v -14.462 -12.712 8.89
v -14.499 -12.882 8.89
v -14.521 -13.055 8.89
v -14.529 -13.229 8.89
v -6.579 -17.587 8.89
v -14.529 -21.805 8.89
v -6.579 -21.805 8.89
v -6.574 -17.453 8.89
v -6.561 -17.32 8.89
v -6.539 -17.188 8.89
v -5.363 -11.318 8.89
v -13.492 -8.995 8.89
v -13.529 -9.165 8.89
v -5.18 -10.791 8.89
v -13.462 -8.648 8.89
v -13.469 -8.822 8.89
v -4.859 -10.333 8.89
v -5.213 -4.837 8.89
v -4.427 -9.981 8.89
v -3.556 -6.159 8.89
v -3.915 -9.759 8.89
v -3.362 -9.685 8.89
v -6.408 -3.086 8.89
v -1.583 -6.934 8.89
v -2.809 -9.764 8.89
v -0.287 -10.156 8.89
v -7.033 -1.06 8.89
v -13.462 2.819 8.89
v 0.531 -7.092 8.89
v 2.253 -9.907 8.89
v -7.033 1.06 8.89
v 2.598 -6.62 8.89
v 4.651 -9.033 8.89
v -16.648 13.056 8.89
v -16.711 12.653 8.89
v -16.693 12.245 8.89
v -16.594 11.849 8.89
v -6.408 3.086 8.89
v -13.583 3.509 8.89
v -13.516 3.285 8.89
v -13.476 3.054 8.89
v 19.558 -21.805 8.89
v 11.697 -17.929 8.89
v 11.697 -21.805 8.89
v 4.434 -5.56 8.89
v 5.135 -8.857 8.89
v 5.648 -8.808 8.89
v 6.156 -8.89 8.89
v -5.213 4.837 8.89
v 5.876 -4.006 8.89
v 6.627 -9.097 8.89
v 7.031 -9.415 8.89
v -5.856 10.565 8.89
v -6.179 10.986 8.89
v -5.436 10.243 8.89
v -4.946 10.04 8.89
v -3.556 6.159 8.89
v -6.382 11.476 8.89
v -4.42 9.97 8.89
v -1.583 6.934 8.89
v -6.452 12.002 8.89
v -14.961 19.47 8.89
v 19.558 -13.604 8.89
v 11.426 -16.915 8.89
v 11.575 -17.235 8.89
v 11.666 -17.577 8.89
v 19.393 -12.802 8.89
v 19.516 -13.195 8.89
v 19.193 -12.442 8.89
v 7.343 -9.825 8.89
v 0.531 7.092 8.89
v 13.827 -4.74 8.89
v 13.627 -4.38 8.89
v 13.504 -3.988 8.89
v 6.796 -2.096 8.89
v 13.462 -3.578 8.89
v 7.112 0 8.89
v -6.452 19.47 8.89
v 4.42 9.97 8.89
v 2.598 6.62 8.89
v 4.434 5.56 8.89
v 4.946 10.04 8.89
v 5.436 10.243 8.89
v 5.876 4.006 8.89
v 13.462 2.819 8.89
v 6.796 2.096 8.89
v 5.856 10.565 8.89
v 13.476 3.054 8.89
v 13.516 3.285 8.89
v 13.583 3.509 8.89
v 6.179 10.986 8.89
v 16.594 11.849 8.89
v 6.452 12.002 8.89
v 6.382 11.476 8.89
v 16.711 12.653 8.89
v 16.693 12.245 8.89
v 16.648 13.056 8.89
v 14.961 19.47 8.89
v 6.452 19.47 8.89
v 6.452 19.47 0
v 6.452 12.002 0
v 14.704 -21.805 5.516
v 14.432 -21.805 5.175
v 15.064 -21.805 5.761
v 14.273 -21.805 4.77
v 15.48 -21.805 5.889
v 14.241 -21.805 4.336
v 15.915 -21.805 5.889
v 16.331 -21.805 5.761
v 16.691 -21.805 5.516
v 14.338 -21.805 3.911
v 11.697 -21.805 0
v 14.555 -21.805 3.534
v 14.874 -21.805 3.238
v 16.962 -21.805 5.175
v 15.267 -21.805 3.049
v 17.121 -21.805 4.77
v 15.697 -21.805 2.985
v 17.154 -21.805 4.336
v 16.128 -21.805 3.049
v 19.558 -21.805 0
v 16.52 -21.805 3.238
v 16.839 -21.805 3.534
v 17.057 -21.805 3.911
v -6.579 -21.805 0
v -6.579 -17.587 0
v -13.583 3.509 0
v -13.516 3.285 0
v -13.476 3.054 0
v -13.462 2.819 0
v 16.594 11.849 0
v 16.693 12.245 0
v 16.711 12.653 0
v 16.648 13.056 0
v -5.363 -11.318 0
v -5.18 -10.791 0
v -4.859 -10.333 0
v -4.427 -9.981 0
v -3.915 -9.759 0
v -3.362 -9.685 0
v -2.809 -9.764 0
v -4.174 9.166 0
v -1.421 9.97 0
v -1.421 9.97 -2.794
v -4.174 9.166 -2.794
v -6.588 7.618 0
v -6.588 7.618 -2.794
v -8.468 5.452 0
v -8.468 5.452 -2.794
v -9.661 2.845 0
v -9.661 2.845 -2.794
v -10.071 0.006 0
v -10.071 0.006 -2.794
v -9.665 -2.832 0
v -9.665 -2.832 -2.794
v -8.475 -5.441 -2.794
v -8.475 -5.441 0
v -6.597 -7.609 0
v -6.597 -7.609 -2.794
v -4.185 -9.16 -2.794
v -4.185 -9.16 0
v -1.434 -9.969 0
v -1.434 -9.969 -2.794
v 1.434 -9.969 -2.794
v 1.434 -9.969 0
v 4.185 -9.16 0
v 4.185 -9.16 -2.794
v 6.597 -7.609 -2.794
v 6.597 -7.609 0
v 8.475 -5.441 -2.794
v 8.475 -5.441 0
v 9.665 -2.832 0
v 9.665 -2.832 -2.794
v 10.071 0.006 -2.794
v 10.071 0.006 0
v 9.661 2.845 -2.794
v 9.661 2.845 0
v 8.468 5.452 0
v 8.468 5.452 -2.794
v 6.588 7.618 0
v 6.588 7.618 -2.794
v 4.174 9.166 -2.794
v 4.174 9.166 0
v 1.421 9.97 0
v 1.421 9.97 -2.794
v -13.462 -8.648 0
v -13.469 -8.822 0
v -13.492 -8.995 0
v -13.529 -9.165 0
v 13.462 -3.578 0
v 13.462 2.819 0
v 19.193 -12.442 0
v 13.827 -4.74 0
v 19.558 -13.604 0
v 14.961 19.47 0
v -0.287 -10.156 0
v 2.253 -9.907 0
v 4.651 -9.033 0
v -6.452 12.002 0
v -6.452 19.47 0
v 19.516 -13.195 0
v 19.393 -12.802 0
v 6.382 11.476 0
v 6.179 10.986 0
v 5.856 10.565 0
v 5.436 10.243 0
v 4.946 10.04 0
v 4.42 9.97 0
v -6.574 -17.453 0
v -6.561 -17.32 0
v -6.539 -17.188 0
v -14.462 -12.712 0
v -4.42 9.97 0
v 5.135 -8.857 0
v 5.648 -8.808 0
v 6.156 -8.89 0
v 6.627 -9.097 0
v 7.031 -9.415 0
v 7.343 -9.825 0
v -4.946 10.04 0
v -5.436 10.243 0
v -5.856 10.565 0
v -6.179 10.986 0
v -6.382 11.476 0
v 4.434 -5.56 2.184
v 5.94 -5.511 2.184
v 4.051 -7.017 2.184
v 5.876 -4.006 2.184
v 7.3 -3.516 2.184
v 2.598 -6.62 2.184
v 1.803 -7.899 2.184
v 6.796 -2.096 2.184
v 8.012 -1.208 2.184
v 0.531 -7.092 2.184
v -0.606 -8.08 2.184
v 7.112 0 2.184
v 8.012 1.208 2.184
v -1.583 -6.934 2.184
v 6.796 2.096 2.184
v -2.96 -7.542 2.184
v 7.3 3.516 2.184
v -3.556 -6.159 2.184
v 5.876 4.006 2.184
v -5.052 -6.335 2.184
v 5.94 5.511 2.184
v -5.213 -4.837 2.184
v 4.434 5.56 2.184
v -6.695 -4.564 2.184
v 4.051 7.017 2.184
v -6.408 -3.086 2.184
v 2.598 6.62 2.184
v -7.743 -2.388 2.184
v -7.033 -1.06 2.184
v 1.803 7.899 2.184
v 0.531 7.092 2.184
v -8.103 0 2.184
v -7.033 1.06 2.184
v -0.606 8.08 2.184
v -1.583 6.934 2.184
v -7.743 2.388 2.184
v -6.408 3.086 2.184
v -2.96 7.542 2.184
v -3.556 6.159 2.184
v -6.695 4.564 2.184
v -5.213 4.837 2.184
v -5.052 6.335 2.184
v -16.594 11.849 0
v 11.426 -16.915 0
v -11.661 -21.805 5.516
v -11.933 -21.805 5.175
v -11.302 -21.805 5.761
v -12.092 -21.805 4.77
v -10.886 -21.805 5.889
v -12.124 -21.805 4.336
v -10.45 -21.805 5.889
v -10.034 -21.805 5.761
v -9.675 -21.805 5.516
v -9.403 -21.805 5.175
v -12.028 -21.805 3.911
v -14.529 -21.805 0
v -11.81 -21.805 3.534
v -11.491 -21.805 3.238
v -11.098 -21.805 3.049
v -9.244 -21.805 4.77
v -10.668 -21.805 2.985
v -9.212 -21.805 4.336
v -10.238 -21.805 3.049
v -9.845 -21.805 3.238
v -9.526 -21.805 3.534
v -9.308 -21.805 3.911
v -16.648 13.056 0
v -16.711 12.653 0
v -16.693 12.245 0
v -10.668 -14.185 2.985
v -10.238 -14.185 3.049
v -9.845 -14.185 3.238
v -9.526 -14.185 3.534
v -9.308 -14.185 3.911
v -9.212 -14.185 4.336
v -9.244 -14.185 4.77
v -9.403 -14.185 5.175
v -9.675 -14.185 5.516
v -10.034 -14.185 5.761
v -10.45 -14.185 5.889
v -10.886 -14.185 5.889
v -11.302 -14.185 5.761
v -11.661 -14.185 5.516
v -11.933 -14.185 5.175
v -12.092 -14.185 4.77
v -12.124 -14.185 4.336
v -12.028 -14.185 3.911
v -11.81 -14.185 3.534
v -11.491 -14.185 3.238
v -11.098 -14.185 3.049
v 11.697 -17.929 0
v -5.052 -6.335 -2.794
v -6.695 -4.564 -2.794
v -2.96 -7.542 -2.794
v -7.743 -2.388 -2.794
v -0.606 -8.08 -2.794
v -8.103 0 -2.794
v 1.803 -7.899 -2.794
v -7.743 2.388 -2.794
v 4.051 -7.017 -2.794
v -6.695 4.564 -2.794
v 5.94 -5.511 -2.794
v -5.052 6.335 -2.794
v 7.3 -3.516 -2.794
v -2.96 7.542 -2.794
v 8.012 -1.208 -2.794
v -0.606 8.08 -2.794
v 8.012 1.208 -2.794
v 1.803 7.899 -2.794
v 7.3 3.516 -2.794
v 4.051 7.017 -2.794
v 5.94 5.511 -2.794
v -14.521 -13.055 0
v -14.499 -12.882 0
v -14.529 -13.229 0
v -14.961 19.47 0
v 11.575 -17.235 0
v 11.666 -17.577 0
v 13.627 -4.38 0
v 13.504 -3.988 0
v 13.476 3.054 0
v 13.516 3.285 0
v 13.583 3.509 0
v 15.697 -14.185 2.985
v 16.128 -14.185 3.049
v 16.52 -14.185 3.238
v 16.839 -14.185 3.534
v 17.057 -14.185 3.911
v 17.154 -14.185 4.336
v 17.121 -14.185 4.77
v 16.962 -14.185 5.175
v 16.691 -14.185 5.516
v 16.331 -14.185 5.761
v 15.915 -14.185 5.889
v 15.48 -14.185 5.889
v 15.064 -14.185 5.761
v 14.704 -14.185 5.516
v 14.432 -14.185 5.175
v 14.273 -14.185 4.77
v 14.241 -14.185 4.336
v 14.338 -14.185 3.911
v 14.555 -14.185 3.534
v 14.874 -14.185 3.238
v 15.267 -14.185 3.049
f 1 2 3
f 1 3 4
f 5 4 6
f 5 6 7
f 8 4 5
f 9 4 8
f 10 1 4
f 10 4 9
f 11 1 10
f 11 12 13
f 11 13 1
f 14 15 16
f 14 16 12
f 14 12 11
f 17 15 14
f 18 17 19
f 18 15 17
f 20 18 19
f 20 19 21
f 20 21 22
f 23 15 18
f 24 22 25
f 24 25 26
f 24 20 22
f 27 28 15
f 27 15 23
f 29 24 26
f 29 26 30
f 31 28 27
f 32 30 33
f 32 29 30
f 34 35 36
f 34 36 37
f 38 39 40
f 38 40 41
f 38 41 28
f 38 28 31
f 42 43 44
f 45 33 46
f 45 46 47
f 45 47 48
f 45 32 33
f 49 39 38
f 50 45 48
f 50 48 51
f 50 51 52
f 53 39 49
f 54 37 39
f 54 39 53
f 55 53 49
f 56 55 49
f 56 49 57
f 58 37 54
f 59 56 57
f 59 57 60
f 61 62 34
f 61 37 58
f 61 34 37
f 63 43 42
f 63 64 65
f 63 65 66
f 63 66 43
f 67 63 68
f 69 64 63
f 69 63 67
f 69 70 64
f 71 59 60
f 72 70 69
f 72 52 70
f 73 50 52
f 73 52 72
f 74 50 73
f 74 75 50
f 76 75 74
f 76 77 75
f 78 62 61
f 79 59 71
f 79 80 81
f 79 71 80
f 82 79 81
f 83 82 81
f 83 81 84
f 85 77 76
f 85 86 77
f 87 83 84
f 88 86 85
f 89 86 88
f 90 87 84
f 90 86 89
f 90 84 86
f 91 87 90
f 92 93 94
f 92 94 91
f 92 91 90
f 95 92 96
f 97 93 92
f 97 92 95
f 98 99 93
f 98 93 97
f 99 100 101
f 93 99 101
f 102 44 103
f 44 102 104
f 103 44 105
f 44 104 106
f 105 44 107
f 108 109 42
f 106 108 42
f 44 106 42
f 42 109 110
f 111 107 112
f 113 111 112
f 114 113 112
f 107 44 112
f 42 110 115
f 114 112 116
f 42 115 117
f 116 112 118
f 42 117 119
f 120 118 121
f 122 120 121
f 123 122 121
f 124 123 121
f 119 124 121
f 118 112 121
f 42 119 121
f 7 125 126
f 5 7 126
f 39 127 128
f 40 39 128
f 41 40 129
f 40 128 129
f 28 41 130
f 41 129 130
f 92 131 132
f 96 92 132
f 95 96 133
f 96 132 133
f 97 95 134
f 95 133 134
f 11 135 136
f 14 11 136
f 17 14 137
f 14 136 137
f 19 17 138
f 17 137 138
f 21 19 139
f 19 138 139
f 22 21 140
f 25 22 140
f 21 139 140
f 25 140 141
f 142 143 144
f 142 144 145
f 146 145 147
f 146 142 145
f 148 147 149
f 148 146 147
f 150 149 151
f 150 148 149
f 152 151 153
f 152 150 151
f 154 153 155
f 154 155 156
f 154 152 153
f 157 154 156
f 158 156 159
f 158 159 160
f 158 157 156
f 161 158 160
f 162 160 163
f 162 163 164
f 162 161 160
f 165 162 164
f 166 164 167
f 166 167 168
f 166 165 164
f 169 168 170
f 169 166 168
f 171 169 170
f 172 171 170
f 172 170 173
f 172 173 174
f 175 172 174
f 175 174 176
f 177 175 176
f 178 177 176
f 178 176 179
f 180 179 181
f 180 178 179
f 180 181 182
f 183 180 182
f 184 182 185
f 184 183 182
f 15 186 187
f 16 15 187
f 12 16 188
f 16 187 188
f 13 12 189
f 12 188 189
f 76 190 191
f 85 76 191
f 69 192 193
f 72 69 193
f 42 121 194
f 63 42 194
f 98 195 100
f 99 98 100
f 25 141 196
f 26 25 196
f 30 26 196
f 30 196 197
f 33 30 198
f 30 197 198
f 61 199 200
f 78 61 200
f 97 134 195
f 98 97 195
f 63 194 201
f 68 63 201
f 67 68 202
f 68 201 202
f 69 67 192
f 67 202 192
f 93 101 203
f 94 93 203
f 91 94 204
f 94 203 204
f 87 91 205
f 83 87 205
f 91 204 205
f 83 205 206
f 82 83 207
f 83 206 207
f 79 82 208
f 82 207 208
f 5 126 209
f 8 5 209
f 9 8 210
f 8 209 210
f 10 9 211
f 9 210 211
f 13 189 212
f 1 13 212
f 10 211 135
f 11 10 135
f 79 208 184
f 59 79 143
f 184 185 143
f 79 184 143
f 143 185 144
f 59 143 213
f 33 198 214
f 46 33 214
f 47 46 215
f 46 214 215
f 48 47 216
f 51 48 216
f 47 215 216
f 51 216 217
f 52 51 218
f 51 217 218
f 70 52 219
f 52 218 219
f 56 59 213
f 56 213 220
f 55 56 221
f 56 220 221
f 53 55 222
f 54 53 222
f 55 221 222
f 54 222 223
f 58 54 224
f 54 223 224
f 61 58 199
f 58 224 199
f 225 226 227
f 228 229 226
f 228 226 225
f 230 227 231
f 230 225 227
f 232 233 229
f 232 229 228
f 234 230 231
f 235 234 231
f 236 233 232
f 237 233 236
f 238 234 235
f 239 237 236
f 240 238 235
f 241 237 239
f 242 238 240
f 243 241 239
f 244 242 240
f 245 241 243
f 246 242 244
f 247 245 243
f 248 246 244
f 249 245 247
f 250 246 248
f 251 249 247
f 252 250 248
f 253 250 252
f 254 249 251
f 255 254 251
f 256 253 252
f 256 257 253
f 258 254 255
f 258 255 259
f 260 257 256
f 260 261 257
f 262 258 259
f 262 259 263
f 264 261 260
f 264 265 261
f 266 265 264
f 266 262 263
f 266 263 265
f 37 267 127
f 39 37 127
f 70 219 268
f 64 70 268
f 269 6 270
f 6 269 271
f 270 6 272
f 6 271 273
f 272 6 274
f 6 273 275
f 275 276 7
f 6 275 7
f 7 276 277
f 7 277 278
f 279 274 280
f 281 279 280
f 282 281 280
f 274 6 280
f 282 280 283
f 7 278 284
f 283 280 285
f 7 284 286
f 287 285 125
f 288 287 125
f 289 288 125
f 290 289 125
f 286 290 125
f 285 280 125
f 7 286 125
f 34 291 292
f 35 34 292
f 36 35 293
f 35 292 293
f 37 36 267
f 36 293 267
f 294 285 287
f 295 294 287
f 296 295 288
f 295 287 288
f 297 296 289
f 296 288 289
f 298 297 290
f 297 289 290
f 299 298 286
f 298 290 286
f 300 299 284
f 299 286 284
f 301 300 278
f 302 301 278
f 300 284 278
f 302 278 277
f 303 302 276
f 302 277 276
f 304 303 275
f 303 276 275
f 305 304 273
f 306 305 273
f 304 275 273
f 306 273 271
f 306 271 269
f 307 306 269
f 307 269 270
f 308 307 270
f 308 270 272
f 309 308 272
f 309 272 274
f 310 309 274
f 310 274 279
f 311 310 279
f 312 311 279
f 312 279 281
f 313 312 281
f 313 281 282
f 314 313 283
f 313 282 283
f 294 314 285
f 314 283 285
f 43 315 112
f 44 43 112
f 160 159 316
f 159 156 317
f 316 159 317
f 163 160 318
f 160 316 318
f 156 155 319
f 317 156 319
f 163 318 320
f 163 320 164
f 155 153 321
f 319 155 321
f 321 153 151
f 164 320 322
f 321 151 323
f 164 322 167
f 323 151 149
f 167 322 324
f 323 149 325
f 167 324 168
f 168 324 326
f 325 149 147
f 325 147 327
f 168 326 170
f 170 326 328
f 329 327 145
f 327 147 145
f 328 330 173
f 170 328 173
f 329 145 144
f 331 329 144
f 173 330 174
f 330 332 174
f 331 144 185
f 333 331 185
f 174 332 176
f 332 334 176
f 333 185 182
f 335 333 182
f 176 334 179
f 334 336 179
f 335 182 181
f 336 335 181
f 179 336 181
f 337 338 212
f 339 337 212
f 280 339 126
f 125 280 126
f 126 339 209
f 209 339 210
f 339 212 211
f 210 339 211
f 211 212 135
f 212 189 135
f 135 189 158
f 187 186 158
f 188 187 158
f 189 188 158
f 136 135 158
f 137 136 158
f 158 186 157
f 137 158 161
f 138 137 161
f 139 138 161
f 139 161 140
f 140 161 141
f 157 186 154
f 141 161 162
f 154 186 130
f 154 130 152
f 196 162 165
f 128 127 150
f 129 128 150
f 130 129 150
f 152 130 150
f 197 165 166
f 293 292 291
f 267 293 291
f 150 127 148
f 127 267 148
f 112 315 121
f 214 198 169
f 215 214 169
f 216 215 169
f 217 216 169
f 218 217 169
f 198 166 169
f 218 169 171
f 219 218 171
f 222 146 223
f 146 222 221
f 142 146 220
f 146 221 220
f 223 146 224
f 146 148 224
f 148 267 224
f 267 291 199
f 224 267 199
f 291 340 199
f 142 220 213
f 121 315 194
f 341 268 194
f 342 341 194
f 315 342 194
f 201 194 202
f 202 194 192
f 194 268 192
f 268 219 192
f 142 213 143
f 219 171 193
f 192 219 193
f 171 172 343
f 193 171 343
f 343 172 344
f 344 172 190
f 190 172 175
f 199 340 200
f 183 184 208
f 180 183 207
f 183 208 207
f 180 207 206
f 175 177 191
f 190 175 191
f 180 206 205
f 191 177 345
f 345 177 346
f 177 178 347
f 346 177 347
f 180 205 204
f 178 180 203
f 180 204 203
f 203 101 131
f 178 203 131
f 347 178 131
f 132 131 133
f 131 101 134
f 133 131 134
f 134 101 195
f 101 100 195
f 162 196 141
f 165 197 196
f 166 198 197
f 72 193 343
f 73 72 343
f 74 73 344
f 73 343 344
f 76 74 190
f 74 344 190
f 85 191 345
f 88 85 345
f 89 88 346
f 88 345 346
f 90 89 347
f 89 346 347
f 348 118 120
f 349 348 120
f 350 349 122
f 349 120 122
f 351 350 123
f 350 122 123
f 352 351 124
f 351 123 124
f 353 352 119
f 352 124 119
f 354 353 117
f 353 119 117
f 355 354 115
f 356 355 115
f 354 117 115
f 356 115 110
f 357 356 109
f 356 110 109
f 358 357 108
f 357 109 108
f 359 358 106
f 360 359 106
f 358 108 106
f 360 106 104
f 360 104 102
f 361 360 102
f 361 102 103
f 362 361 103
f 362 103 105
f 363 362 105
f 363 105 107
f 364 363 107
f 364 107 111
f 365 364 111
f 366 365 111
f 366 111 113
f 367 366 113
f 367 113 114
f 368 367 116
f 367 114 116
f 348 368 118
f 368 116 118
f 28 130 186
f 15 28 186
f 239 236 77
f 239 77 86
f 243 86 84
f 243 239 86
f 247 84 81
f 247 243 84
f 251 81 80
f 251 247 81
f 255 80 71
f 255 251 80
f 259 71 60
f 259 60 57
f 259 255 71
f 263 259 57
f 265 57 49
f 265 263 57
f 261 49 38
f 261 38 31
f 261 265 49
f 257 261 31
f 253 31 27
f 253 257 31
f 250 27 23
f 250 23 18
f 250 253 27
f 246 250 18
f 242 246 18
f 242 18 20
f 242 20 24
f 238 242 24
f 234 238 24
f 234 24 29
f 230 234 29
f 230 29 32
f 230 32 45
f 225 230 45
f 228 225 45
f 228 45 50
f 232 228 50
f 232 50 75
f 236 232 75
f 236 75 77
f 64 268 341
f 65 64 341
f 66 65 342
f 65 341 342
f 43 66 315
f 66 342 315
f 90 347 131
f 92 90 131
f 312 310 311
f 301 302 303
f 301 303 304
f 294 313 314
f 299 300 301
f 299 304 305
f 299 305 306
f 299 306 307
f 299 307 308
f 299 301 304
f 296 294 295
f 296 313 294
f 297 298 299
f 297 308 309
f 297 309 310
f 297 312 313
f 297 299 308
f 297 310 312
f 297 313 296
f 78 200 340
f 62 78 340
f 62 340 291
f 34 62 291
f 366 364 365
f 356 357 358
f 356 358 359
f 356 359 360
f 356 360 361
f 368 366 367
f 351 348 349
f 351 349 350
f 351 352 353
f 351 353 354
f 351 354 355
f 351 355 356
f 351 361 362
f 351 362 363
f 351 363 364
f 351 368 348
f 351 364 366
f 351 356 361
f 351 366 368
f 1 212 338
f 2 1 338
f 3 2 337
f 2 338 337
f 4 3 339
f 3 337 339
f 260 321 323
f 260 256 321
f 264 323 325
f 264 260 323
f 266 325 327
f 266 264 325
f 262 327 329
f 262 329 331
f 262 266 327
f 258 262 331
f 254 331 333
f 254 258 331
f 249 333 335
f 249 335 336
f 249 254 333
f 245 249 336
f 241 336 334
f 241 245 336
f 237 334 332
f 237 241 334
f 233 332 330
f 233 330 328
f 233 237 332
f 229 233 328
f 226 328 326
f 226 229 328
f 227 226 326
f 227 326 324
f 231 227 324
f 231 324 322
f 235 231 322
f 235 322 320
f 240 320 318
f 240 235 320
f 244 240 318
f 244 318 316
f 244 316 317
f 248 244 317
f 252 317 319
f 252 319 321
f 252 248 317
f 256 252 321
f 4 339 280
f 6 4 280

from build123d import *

# Parameters (mm, degrees)
SKETCH1_R           = 7.112
BOSS_EXTRUDE1_DEPTH = 8.89
SKETCH2_R           = 8.1026
BOSS_EXTRUDE2_DEPTH = 2.794
CUT_EXTRUDE1_START  = -2.1844
SKETCH4_R           = 8.1026
CUT_EXTRUDE1_DEPTH  = 2.1844
SKETCH5_R           = 1.4605
CUT_EXTRUDE2_DEPTH  = 7.62


with BuildPart() as part:
    # Sketch1 → Boss-Extrude1 (new body)
    with BuildSketch(Plane.XY):
        with BuildLine():
            Line((4.4196, 9.970322522), (-4.4196, 9.970322522))
            ThreePointArc((-4.4196, 9.970322522), (-5.856440979, 10.565481542), (-6.4516, 12.002322522))
            Line((-6.4516, 12.002322522), (-6.4516, 19.469922522))
            Line((-6.4516, 19.469922522), (-14.9606, 19.469922522))
            Line((-14.9606, 19.469922522), (-16.647754284, 13.056434928))
            ThreePointArc((-16.647754284, 13.056434928), (-16.712590479, 12.448835423), (-16.593859144, 11.849432587))
            Line((-16.593859144, 11.849432587), (-13.582754018, 3.50945712))
            ThreePointArc((-13.582754018, 3.50945712), (-13.492416148, 3.169677348), (-13.462, 2.819411617))
            Line((-13.462, 2.819411617), (-13.462, 0))
            Line((-13.462, 0), (-13.462, -8.647780438))
            ThreePointArc((-13.462, -8.647780438), (-13.478784036, -8.908411634), (-13.528858878, -9.164737275))
            Line((-13.528858878, -9.164737275), (-14.461941122, -12.711722544))
            ThreePointArc((-14.461941122, -12.711722544), (-14.512015964, -12.968048185), (-14.5288, -13.228679381))
            Line((-14.5288, -13.228679381), (-14.5288, -21.805077478))
            Line((-14.5288, -21.805077478), (-6.5786, -21.805077478))
            Line((-6.5786, -21.805077478), (-6.5786, -17.586954898))
            ThreePointArc((-6.5786, -17.586954898), (-6.568684578, -17.386460615), (-6.539035081, -17.187923011))
            Line((-6.539035081, -17.187923011), (-5.363383159, -11.317690055))
            ThreePointArc((-5.363383159, -11.317690055), (-4.426978503, -9.980685151), (-2.809123398, -9.763934951))
            ThreePointArc((-2.809123398, -9.763934951), (0.991075795, -10.11154631), (4.651460928, -9.032691251))
            ThreePointArc((4.651460928, -9.032691251), (6.155731201, -8.889980119), (7.342613103, -9.82513084))
            Line((7.342613103, -9.82513084), (11.42555999, -16.91467556))
            ThreePointArc((11.42555999, -16.91467556), (11.62774502, -17.403914002), (11.6967, -17.928774222))
            Line((11.6967, -17.928774222), (11.6967, -21.805077478))
            Line((11.6967, -21.805077478), (19.558, -21.805077478))
            Line((19.558, -21.805077478), (19.558, -13.603952816))
            ThreePointArc((19.558, -13.603952816), (19.464666148, -12.995185564), (19.193238615, -12.442342123))
            Line((19.193238615, -12.442342123), (13.826761385, -4.739935355))
            ThreePointArc((13.826761385, -4.739935355), (13.555333852, -4.187091915), (13.462, -3.578324662))
            Line((13.462, -3.578324662), (13.462, 0))
            Line((13.462, 0), (13.462, 2.819411617))
            ThreePointArc((13.462, 2.819411617), (13.492416148, 3.169677348), (13.582754018, 3.50945712))
            Line((13.582754018, 3.50945712), (16.593859144, 11.849432587))
            ThreePointArc((16.593859144, 11.849432587), (16.712590479, 12.448835423), (16.647754284, 13.056434928))
            Line((16.647754284, 13.056434928), (14.9606, 19.469922522))
            Line((14.9606, 19.469922522), (6.4516, 19.469922522))
            Line((6.4516, 19.469922522), (6.4516, 12.002322522))
            ThreePointArc((6.4516, 12.002322522), (5.856440979, 10.565481542), (4.4196, 9.970322522))
        make_face()
        Circle(SKETCH1_R, mode=Mode.SUBTRACT)
    extrude(amount=BOSS_EXTRUDE1_DEPTH)

    # Sketch2 → Boss-Extrude2 (add)
    with BuildSketch(Plane(origin=(0, 0, 0), x_dir=(-1, 0, 0), z_dir=(0, 0, -1))):
        with BuildLine():
            Line((-1.42116995, 9.970322522), (1.42116995, 9.970322522))
            ThreePointArc((1.42116995, 9.970322522), (0, -10.0711), (-1.42116995, 9.970322522))
        make_face()
        Circle(SKETCH2_R, mode=Mode.SUBTRACT)
    extrude(amount=BOSS_EXTRUDE2_DEPTH)

    # Sketch4 → Cut-Extrude1 (cut)
    with BuildSketch(Plane(origin=(0, 0, 0), x_dir=(-1, 0, 0), z_dir=(0, 0, -1)).offset(CUT_EXTRUDE1_START)):
        Circle(SKETCH4_R)
    extrude(amount=CUT_EXTRUDE1_DEPTH, mode=Mode.SUBTRACT)

    # Sketch5 → Cut-Extrude2 (cut)
    with BuildSketch(Plane.XZ.offset(21.805077478)):
        with Locations(Location((-10.668, 4.445, 0), (0, 0, 270))):
            Circle(SKETCH5_R)
        with Locations(Location((15.6972, 4.445, 0), (0, 0, 270))):
            Circle(SKETCH5_R)
    extrude(amount=-CUT_EXTRUDE2_DEPTH, mode=Mode.SUBTRACT)


solid = part.part
